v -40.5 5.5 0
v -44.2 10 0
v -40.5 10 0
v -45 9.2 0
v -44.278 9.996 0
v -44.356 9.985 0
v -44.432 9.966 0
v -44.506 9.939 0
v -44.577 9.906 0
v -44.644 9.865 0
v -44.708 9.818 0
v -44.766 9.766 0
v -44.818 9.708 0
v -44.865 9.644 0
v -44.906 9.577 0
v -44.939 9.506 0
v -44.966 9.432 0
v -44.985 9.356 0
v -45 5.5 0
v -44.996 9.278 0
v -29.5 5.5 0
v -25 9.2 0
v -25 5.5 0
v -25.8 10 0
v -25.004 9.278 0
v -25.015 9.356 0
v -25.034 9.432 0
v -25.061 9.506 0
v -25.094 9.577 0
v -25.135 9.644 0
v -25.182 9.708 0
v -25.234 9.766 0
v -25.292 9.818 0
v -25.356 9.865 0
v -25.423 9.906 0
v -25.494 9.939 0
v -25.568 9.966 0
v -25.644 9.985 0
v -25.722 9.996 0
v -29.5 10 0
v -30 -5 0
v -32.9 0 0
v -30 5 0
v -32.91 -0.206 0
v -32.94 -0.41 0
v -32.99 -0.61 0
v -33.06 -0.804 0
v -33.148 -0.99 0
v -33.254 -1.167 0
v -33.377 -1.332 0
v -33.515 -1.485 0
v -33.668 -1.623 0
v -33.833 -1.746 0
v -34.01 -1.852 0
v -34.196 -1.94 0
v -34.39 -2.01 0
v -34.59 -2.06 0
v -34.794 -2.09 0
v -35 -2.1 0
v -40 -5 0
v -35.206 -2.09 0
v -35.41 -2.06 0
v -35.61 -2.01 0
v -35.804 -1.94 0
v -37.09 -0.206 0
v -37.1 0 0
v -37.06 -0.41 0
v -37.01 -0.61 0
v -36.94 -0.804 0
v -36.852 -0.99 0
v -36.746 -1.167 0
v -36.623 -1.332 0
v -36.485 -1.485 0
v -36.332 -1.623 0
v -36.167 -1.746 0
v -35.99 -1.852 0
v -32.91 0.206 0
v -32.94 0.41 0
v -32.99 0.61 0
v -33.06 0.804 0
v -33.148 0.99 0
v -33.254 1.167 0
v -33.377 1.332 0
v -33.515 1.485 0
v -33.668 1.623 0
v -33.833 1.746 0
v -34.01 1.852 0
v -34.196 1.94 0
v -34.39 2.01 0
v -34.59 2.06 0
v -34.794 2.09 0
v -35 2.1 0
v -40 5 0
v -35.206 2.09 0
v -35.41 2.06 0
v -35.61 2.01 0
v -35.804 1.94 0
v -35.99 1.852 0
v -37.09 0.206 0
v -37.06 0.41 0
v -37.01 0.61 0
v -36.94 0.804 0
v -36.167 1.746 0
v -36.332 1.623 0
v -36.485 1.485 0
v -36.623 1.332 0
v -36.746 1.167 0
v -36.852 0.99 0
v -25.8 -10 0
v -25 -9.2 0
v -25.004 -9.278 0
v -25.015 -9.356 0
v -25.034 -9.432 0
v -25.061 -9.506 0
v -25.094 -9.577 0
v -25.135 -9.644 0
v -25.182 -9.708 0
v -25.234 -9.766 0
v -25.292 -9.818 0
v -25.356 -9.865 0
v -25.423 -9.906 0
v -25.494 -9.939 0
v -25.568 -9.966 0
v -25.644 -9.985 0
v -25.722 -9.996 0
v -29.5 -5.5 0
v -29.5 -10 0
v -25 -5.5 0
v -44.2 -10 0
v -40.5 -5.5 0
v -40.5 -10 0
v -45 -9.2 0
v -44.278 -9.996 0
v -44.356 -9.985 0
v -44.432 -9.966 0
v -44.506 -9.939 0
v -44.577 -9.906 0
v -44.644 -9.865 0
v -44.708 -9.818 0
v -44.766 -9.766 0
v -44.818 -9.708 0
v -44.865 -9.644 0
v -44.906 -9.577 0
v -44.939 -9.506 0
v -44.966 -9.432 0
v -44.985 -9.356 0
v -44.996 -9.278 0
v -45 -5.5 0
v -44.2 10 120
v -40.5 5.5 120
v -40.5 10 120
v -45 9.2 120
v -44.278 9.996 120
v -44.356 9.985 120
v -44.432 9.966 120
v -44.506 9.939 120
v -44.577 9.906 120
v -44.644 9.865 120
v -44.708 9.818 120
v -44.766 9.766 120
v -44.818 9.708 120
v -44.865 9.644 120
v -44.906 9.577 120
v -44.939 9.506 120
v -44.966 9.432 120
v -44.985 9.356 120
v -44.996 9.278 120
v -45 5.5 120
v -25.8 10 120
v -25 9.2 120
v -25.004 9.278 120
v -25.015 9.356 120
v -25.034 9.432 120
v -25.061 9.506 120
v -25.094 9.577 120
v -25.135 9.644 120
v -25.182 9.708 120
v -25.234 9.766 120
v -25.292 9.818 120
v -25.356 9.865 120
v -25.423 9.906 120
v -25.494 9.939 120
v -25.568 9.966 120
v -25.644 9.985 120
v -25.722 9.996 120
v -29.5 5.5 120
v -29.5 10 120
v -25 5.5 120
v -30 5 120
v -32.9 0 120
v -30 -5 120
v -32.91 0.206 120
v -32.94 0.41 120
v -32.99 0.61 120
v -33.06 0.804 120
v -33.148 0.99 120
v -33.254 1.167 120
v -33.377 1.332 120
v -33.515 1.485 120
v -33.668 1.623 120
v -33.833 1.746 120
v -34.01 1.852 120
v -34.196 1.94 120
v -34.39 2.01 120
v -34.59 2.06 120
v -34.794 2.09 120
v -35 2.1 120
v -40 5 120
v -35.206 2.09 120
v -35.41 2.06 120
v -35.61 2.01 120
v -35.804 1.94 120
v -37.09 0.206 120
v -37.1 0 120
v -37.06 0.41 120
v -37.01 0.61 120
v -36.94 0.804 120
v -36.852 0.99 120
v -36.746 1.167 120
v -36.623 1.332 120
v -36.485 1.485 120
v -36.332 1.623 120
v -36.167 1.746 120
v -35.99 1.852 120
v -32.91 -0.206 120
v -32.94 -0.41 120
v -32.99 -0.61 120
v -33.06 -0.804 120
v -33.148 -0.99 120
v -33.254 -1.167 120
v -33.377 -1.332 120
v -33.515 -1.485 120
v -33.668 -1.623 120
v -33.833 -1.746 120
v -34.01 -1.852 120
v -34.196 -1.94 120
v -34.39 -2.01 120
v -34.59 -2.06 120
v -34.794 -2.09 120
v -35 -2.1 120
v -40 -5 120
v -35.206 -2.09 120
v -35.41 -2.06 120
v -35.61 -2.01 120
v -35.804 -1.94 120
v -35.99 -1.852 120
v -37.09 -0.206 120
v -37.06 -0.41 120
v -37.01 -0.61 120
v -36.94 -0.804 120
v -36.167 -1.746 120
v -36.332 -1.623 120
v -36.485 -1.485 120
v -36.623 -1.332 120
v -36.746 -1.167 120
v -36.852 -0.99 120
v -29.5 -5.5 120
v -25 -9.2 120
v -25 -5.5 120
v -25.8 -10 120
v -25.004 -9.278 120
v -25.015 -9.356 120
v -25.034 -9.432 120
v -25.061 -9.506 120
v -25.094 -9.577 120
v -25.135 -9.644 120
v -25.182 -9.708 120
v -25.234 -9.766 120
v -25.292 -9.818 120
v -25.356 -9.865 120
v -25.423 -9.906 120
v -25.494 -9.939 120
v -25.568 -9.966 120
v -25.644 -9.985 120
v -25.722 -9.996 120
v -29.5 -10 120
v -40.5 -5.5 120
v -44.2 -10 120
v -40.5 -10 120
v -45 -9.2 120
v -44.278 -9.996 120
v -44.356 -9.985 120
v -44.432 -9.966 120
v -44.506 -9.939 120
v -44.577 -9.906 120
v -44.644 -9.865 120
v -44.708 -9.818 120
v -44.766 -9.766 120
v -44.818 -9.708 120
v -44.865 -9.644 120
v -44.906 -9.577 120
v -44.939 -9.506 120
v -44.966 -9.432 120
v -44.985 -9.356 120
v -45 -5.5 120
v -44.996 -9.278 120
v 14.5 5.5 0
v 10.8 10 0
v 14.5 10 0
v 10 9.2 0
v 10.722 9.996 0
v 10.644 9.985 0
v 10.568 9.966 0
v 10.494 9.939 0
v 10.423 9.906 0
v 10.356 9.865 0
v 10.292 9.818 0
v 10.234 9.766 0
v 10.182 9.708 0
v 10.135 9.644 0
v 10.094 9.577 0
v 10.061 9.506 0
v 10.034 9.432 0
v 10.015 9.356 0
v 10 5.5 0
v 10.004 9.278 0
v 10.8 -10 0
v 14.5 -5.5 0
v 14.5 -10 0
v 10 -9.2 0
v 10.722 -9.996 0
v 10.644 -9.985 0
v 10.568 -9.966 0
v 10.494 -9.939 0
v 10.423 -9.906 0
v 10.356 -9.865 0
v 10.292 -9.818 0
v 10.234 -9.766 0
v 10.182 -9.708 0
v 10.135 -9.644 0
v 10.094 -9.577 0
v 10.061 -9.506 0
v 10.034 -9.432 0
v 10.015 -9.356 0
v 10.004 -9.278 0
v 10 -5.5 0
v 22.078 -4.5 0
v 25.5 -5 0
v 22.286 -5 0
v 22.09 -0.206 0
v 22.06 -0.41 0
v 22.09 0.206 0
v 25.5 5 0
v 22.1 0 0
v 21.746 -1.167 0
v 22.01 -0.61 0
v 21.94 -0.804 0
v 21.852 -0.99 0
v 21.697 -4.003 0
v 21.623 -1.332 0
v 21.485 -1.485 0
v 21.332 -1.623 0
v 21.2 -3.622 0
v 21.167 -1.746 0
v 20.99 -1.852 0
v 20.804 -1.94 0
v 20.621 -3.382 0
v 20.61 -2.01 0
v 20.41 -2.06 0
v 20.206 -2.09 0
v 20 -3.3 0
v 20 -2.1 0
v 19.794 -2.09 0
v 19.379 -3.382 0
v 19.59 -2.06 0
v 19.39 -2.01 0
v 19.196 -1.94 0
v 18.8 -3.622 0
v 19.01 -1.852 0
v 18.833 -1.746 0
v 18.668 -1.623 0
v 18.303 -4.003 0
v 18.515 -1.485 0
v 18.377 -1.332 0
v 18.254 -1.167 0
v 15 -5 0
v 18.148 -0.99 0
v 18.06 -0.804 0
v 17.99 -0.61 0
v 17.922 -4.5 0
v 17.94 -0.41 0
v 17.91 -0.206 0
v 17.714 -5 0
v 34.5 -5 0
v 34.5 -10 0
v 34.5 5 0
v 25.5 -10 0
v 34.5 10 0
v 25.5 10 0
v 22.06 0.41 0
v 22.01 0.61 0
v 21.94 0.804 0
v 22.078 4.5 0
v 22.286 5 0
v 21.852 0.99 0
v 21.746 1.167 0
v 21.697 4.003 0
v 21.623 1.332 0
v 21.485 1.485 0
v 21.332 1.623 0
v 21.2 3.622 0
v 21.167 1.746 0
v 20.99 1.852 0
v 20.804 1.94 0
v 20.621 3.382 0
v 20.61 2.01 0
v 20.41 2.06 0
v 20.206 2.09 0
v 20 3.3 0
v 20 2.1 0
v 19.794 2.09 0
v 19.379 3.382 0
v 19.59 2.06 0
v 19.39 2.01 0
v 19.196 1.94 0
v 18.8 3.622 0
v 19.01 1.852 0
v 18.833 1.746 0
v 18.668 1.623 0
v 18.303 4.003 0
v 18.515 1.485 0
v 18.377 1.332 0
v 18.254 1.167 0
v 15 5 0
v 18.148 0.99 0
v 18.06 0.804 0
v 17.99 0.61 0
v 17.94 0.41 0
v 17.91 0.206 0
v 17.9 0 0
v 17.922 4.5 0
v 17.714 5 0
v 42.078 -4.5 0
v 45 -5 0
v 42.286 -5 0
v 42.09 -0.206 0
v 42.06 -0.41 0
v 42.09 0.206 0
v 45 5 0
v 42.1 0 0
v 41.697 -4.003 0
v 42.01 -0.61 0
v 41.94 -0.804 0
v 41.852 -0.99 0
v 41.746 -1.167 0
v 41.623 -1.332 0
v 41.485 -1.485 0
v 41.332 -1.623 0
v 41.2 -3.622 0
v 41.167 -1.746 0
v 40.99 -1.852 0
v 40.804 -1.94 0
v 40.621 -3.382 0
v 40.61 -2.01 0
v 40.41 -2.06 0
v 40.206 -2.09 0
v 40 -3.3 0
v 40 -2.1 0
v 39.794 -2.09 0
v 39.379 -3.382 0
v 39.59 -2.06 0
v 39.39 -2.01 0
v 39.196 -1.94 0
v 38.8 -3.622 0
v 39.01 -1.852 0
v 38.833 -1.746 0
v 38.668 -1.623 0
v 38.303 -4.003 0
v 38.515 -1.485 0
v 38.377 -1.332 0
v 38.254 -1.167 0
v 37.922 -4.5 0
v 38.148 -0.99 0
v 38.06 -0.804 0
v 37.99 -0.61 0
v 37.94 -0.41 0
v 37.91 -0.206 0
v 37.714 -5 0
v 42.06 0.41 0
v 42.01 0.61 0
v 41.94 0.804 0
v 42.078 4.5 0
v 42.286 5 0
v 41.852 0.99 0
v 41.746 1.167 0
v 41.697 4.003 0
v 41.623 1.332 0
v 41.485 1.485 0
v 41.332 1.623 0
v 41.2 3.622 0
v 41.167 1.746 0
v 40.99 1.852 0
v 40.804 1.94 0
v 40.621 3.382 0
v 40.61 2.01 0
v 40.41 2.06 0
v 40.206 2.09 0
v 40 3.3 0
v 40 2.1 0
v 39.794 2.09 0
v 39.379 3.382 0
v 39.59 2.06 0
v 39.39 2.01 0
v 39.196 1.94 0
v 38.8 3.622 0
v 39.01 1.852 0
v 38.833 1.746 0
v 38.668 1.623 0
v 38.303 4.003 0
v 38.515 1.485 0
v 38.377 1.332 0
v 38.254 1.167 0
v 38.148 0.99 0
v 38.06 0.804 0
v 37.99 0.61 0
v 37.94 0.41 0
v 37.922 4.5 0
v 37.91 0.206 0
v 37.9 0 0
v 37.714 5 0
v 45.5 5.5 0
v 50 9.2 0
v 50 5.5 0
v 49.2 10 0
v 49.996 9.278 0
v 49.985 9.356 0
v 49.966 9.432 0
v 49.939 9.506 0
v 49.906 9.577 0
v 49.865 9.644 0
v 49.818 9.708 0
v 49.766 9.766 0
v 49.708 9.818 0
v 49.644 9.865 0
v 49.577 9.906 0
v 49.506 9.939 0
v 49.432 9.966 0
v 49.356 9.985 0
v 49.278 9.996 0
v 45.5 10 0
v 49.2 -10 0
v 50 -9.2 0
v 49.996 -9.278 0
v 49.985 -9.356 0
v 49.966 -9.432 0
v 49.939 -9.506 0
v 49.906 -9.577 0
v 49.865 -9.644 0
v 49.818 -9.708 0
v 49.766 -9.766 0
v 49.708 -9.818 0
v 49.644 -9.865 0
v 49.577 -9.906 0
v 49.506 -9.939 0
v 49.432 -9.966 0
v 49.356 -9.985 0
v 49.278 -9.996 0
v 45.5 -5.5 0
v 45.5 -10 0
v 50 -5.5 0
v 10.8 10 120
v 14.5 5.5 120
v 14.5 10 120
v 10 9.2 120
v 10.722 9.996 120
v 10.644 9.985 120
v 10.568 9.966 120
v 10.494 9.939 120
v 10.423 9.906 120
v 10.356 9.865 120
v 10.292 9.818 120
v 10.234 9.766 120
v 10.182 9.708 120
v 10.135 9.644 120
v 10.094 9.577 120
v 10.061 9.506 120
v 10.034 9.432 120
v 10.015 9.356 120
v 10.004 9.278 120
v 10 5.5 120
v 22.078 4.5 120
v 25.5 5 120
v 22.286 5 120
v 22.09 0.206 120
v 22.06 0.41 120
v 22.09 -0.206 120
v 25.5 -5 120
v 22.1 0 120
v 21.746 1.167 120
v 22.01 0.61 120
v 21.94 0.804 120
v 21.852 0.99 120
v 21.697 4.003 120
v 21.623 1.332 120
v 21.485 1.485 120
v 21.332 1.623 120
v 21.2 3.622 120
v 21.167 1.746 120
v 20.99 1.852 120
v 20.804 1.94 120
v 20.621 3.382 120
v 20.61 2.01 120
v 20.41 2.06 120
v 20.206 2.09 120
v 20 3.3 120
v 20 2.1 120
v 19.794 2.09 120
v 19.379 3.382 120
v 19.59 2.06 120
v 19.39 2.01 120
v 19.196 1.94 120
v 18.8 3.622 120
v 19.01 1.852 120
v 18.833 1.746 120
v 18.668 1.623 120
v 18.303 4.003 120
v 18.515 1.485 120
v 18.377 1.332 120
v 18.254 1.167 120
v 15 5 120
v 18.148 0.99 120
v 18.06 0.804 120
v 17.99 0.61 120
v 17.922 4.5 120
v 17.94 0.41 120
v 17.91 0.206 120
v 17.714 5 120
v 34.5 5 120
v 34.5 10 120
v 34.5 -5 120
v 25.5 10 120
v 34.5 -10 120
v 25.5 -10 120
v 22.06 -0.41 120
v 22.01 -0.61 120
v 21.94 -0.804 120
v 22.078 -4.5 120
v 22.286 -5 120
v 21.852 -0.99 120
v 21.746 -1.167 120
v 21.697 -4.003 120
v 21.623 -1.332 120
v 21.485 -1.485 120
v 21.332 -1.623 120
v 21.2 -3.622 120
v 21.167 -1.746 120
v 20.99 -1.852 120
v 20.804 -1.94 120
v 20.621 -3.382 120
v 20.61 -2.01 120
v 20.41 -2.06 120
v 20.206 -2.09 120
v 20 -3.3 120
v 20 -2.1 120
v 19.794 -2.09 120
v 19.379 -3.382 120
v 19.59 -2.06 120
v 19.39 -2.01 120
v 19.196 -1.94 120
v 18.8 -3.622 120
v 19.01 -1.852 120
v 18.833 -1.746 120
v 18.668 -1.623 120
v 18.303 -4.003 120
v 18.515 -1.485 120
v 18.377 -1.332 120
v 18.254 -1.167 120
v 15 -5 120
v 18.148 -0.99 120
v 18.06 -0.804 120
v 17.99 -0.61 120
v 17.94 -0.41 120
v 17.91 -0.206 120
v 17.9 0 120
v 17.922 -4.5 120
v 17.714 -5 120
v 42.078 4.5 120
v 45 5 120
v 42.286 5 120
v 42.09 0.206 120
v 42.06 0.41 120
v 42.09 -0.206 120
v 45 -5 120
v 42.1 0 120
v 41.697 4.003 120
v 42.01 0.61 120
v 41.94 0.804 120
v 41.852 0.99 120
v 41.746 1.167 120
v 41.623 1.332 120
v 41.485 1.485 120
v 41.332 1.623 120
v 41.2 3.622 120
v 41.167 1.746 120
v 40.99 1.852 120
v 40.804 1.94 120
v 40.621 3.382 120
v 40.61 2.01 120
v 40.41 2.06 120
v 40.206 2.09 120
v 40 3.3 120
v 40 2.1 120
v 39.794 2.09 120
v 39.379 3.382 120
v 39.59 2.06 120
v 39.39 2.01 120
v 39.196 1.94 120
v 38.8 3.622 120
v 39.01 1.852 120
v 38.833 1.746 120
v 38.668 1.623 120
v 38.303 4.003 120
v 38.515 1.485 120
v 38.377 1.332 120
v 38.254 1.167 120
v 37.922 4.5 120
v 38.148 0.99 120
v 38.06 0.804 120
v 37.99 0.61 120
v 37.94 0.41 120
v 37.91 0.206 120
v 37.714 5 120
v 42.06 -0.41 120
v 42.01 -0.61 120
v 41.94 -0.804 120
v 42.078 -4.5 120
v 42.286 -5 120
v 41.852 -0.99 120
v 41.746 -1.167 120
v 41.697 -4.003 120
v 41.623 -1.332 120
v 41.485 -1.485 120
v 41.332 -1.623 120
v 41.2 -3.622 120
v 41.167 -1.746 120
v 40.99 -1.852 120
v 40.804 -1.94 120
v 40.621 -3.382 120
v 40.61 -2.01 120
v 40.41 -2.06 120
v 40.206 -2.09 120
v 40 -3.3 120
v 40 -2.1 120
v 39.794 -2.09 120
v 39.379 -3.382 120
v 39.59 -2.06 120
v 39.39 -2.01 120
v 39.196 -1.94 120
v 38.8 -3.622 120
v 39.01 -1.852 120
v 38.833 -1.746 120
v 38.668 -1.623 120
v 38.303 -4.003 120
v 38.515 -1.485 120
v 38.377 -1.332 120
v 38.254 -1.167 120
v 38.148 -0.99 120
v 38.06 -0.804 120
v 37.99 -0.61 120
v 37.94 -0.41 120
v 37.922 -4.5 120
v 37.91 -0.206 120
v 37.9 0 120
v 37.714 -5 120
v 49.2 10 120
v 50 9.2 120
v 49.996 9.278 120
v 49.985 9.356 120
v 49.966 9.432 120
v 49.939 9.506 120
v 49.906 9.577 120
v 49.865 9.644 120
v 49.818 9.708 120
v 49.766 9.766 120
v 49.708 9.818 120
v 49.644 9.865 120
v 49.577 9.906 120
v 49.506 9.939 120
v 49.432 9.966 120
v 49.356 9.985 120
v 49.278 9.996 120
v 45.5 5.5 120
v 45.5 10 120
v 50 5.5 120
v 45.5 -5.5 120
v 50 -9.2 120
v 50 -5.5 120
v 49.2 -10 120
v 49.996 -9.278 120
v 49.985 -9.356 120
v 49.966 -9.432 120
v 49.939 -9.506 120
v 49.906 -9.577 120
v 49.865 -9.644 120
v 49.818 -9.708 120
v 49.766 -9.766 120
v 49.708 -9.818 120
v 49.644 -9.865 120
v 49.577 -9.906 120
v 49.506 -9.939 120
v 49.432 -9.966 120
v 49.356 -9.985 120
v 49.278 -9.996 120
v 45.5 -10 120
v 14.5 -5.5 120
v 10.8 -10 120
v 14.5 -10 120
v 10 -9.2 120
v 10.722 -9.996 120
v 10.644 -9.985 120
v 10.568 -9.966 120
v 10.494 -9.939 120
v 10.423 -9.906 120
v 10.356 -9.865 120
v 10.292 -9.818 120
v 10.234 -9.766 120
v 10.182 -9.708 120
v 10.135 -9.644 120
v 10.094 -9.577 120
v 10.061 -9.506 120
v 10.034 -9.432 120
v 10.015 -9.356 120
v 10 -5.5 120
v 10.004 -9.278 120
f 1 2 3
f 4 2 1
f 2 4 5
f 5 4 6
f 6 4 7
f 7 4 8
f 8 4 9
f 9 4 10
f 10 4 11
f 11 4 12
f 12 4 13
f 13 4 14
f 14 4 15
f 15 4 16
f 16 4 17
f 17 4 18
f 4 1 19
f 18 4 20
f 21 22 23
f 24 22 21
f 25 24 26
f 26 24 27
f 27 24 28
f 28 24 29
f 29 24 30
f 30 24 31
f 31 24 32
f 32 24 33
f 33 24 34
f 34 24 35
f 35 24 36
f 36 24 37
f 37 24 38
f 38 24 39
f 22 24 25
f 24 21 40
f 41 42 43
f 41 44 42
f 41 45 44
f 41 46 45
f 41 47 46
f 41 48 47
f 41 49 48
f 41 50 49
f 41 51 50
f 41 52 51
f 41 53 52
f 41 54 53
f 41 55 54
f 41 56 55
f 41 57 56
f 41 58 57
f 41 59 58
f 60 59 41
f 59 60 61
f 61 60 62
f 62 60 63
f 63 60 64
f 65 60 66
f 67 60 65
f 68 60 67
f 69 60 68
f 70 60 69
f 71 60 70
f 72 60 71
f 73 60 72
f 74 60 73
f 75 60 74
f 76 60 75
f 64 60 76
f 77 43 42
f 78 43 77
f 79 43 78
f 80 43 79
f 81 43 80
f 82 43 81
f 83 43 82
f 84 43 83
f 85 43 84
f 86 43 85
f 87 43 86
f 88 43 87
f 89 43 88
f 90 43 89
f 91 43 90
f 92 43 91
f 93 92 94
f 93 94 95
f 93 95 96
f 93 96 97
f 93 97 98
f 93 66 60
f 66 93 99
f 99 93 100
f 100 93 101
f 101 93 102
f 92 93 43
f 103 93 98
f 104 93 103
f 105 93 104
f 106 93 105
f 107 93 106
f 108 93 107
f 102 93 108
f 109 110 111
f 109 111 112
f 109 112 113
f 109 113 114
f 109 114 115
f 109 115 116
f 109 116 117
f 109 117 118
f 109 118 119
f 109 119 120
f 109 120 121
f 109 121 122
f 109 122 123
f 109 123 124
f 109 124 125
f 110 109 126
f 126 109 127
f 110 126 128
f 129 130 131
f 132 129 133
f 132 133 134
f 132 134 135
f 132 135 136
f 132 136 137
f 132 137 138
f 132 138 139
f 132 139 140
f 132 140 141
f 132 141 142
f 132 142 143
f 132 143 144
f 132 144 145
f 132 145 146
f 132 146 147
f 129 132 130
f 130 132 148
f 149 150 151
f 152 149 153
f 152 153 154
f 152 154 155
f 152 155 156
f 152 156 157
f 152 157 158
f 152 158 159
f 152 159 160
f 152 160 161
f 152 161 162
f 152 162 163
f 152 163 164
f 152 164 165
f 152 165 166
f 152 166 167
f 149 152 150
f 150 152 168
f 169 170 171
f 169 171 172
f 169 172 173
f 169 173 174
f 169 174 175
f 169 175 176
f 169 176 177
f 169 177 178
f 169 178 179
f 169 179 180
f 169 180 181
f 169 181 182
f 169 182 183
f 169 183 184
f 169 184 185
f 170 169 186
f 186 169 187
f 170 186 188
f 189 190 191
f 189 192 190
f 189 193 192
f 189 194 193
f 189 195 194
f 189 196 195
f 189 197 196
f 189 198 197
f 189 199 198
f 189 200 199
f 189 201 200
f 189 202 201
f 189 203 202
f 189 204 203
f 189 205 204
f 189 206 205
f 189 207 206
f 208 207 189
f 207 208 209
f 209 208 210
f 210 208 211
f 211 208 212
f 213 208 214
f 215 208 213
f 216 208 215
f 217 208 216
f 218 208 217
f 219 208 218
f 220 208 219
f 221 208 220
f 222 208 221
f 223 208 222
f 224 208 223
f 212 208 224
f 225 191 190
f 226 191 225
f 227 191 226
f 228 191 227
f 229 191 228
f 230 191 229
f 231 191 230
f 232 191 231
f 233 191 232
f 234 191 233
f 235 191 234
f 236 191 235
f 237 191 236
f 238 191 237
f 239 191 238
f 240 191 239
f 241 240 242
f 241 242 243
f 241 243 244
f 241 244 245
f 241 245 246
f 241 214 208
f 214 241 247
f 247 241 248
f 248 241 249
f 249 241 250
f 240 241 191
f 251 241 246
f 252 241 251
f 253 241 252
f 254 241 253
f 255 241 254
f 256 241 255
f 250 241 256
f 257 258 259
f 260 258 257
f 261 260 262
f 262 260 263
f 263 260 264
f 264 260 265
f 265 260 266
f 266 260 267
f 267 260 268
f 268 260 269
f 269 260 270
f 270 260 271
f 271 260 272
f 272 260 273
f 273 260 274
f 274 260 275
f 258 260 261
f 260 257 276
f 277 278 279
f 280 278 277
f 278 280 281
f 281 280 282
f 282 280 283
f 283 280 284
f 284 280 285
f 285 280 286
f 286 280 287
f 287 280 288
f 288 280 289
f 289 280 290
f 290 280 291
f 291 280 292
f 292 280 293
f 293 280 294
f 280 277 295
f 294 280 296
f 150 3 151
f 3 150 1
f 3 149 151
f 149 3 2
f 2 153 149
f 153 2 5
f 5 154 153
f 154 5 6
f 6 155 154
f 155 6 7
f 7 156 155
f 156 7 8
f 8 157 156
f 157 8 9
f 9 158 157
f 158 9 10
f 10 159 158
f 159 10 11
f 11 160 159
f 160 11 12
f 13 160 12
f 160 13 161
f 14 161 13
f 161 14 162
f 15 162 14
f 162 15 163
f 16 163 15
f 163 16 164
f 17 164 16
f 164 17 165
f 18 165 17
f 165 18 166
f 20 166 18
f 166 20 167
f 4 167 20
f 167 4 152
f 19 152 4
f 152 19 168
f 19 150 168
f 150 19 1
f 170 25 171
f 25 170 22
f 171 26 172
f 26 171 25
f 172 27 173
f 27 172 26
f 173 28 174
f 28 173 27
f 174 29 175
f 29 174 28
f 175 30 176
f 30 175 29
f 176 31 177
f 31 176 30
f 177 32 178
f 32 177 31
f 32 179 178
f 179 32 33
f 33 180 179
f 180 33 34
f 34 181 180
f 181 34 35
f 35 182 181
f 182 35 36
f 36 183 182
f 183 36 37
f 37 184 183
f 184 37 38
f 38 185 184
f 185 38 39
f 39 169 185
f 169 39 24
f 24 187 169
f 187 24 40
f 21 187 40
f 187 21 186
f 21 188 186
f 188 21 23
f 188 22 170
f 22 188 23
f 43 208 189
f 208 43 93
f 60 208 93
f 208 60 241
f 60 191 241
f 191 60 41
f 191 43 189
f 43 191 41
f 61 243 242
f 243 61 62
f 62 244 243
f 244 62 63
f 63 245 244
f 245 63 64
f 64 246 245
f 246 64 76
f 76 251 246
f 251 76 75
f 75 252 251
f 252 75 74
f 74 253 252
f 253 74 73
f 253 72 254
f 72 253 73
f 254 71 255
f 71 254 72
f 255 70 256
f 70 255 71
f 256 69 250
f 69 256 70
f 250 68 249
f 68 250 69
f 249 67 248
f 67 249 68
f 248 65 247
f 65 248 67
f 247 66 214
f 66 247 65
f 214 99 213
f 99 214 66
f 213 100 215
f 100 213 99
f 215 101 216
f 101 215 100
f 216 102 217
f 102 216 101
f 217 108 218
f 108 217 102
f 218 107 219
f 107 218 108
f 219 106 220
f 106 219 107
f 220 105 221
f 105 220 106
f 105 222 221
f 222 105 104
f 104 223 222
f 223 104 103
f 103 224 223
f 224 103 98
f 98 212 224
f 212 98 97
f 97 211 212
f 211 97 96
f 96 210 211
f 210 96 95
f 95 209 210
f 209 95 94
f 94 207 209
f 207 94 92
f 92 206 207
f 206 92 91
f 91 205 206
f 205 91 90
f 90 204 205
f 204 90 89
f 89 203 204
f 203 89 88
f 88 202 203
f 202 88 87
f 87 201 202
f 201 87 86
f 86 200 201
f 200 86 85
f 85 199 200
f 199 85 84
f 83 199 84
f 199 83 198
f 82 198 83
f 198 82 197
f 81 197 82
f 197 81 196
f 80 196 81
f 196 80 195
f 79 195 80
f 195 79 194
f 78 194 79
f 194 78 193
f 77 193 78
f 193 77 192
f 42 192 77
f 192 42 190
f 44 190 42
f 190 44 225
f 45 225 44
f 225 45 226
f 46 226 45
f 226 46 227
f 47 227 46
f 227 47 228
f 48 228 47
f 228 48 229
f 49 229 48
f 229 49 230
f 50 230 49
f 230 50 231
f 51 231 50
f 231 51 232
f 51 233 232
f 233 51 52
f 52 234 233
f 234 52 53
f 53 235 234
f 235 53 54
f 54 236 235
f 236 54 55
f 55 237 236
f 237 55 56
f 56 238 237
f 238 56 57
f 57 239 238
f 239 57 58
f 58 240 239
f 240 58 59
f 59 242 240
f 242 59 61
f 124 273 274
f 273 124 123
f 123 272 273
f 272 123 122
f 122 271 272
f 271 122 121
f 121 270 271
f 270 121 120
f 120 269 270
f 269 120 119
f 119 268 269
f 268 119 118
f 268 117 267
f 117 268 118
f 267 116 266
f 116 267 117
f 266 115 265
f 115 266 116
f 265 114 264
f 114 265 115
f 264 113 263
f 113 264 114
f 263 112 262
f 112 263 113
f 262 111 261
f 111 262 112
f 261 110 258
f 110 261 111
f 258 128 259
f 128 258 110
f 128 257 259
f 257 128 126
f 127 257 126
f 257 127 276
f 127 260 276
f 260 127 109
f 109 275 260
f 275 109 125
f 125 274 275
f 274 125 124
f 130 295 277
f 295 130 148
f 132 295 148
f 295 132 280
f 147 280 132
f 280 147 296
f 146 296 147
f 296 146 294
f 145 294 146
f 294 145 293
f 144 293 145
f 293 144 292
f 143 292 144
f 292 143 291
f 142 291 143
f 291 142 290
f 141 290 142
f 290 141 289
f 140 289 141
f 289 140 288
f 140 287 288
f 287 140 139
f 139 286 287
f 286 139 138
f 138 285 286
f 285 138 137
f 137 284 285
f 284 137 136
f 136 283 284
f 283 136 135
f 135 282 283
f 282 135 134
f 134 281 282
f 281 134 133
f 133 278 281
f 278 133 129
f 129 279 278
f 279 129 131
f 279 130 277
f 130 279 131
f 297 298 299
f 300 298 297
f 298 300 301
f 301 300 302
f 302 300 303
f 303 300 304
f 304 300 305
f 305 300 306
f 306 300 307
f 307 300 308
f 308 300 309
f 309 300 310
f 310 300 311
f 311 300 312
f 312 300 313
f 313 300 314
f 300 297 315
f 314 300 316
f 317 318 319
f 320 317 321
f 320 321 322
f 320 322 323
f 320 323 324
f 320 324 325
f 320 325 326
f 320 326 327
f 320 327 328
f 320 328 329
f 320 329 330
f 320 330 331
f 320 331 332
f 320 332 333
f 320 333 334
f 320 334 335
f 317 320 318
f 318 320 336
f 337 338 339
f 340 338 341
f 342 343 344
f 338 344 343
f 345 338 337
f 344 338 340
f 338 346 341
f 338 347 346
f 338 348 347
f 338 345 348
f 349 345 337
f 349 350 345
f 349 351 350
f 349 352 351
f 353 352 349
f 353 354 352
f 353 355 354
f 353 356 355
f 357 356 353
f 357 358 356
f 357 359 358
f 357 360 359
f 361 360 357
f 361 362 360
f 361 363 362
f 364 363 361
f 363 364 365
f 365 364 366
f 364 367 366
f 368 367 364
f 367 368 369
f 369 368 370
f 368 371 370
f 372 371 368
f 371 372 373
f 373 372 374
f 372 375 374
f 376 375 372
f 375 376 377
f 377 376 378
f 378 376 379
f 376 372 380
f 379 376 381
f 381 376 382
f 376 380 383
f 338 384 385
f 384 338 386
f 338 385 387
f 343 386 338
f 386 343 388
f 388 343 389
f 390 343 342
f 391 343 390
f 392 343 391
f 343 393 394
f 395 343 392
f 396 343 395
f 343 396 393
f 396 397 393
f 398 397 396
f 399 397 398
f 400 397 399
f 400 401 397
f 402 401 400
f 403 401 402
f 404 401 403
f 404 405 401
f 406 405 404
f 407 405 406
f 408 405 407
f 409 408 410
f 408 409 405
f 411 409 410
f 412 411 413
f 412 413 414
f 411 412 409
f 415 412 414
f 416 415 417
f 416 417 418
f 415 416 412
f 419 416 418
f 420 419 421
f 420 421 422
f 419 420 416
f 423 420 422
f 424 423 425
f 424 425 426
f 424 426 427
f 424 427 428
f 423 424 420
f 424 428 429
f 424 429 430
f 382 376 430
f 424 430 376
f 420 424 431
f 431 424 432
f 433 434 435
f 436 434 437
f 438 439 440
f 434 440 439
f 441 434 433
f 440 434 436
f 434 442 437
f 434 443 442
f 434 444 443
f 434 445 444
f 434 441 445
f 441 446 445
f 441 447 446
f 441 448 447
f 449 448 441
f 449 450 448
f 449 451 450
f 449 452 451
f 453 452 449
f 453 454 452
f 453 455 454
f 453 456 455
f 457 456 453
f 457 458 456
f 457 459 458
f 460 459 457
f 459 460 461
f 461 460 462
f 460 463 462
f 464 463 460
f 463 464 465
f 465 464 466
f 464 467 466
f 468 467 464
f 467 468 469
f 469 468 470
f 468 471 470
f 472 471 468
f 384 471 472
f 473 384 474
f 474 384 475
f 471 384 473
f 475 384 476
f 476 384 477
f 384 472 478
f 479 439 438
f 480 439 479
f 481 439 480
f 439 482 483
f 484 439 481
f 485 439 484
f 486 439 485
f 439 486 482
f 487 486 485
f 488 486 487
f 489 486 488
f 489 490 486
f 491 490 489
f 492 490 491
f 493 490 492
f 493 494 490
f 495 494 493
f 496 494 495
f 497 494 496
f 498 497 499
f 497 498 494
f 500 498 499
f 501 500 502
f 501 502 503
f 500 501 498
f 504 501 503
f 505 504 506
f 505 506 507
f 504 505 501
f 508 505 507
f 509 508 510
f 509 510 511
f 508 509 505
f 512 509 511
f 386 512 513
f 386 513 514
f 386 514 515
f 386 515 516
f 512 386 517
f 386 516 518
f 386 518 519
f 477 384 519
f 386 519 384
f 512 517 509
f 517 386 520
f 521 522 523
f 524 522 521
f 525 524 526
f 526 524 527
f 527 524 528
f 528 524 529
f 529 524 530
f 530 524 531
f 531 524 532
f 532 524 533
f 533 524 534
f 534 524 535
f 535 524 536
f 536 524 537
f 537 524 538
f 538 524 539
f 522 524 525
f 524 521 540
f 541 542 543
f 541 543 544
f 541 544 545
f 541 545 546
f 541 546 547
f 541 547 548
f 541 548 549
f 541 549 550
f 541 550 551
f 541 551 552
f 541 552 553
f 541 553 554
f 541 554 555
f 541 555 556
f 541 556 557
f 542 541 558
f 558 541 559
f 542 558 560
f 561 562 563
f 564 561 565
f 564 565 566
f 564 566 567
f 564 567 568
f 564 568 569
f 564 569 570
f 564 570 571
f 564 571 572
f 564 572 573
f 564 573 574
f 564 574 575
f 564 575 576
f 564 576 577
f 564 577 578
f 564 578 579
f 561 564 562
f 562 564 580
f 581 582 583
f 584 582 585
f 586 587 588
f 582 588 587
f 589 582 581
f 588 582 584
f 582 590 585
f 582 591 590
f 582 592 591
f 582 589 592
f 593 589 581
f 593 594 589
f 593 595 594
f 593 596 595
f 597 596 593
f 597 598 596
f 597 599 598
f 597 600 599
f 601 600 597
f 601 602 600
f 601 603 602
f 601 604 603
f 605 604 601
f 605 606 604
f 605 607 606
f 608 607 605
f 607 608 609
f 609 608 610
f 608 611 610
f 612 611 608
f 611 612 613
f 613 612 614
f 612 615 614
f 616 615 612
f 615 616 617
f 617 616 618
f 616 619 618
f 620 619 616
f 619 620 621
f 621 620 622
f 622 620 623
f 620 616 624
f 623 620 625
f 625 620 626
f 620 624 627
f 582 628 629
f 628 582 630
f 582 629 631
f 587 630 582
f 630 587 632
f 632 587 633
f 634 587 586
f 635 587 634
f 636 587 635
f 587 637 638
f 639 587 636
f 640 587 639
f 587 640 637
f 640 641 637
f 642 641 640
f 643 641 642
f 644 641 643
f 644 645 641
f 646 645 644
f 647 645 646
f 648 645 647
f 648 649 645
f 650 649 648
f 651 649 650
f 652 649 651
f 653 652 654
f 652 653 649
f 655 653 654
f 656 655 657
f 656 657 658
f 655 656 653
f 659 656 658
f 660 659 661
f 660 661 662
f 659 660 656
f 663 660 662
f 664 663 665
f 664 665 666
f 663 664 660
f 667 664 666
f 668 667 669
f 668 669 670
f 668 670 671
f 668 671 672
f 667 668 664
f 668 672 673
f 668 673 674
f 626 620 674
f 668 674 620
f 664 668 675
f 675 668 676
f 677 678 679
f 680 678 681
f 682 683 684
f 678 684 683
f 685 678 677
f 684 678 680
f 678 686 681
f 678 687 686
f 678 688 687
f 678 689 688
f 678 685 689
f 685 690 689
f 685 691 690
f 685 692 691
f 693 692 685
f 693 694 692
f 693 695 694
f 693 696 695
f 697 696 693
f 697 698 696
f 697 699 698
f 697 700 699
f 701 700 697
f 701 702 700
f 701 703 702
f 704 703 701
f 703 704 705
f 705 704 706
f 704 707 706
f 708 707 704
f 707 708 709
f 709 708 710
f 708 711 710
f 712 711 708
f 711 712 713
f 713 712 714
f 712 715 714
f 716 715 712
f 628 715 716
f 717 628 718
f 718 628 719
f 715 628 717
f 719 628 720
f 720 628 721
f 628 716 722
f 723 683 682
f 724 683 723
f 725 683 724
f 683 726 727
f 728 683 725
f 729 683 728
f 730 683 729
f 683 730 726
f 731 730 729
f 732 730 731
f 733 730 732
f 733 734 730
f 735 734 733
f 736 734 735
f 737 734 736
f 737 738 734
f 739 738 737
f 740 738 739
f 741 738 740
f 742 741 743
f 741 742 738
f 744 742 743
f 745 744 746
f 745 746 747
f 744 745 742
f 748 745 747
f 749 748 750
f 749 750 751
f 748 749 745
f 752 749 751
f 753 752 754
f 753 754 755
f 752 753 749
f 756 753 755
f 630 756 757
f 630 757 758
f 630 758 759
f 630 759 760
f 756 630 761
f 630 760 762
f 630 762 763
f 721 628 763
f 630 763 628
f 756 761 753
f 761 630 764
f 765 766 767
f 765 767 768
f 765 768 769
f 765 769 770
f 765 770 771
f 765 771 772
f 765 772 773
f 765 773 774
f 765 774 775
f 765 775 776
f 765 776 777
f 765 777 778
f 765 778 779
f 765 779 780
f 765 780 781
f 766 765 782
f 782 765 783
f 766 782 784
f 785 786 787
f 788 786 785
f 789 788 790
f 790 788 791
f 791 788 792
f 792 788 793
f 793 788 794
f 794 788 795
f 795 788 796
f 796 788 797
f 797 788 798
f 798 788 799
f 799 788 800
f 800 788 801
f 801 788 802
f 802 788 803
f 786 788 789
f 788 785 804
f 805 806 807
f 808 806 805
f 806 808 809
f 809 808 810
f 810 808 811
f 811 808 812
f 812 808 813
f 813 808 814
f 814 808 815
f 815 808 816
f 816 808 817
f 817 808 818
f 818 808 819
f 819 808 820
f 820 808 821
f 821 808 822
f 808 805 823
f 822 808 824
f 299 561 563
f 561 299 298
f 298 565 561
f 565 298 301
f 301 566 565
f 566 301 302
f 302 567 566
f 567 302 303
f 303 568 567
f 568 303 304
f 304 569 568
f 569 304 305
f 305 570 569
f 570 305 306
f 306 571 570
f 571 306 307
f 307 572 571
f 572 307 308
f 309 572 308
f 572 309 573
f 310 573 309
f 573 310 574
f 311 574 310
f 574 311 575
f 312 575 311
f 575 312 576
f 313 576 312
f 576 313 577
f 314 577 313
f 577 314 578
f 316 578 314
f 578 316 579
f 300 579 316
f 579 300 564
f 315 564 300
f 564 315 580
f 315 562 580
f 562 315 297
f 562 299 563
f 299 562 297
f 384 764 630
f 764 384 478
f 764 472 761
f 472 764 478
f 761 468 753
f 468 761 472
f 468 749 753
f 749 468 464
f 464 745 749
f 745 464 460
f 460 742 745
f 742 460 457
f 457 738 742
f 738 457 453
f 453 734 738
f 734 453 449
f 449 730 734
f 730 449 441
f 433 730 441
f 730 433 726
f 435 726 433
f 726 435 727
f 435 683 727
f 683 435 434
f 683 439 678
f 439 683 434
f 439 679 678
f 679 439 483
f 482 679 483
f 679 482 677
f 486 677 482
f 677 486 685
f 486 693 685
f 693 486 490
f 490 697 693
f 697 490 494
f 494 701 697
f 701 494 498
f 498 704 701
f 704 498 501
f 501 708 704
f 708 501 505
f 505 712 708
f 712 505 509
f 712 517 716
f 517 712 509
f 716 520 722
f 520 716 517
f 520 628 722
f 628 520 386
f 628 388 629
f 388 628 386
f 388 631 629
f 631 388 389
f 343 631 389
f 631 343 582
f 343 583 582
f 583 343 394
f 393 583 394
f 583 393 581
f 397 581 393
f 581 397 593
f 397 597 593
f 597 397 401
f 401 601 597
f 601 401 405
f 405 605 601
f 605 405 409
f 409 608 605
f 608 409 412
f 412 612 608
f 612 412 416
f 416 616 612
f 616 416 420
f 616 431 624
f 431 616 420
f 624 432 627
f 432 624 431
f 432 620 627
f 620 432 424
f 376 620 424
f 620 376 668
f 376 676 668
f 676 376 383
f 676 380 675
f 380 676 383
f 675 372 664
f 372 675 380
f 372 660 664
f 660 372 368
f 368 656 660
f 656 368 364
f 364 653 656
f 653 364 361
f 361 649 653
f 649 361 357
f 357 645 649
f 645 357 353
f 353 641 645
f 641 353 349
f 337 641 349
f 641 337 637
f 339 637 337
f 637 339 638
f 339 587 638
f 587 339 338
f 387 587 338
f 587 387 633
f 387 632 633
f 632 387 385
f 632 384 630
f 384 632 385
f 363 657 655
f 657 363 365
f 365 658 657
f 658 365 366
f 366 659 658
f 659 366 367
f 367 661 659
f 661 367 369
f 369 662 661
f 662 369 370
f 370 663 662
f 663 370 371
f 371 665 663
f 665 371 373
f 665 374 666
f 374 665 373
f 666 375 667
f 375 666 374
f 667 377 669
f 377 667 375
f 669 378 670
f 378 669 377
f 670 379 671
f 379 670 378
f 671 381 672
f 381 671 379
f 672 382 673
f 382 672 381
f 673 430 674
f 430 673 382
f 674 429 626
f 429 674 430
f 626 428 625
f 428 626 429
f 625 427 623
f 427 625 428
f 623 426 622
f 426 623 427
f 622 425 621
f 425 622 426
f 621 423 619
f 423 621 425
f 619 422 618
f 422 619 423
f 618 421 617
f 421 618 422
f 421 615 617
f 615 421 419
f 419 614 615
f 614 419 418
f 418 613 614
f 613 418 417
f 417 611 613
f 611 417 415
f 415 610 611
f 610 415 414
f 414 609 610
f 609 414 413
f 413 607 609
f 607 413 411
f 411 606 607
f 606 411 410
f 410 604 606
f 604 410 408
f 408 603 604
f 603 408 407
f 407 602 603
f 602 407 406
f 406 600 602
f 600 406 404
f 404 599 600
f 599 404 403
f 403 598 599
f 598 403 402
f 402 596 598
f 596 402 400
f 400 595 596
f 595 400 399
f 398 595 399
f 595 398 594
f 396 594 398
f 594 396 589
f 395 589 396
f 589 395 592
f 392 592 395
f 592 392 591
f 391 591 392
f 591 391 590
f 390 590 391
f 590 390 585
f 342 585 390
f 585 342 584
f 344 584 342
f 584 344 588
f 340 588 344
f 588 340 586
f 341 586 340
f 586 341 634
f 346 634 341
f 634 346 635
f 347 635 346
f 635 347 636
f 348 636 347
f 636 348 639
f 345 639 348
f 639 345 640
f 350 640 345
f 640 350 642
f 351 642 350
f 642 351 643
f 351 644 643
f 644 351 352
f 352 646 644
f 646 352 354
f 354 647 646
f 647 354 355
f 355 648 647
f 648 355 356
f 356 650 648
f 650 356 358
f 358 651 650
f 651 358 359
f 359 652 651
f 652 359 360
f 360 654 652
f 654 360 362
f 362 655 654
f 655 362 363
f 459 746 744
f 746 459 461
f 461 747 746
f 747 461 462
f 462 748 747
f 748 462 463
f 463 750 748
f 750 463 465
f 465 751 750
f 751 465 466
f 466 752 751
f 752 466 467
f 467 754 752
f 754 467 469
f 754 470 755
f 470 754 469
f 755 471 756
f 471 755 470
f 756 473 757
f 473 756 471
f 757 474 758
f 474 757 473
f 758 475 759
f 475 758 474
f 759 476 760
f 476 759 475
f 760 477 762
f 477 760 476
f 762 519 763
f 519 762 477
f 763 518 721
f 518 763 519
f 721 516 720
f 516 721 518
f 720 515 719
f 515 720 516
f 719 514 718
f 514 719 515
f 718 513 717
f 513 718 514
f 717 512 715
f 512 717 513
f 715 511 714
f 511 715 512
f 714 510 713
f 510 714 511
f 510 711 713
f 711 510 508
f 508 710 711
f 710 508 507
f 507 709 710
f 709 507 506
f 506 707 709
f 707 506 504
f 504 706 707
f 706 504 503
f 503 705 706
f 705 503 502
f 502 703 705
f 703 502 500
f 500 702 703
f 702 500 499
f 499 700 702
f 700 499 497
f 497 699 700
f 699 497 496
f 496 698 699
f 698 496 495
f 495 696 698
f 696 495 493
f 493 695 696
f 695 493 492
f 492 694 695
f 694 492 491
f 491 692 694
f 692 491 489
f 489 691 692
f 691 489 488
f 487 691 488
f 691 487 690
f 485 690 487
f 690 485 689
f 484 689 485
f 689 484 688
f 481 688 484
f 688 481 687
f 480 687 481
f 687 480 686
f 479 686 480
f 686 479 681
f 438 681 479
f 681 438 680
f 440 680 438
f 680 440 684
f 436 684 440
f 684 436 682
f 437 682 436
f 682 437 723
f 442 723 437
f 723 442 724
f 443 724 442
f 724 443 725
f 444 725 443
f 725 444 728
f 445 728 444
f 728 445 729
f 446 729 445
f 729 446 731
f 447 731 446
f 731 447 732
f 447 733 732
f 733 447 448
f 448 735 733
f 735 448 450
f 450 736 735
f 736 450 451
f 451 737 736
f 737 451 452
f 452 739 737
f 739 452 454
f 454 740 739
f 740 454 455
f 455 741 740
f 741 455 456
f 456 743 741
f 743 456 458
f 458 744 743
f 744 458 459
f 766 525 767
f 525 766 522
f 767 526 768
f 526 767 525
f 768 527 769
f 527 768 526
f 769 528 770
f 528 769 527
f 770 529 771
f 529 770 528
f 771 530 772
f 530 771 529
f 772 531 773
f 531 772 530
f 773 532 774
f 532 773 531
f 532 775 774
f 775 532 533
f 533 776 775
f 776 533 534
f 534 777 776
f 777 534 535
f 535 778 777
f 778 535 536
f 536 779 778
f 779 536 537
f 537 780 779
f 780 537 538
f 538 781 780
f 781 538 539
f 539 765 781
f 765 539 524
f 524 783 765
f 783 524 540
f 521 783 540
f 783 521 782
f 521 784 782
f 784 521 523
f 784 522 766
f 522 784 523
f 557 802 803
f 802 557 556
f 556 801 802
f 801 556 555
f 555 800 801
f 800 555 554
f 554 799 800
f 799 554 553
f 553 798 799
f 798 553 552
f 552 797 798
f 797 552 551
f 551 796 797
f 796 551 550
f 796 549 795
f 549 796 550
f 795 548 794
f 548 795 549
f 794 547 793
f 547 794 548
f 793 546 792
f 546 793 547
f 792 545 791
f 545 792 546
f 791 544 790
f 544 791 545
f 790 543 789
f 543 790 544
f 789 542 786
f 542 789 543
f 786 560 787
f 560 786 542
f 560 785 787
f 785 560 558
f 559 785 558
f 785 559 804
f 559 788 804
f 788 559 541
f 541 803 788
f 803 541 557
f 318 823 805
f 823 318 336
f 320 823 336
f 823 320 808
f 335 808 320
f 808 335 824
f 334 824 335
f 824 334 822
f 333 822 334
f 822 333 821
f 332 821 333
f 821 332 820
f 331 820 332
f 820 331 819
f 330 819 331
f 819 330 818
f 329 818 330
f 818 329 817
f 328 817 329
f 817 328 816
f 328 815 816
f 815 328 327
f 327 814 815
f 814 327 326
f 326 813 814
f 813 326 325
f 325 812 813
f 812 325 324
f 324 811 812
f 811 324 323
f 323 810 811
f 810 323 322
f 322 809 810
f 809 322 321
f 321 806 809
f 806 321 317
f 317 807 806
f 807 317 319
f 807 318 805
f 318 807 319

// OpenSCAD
/* 2020 and 2040 metric T-slot extrusion preview. */
use <laser_parts.scad>

$fn = 48;

// Upright 2020 sample.
translate([-35,0,0])
    aluminum_extrusion_2020(length=120);

// Upright 2040 sample, shown in black anodized finish.
translate([30,0,0])
    aluminum_extrusion_2040(length=120,black=true);

$vpr = [68,0,28];
$vpt = [0,0,58];
$vpd = 360;
